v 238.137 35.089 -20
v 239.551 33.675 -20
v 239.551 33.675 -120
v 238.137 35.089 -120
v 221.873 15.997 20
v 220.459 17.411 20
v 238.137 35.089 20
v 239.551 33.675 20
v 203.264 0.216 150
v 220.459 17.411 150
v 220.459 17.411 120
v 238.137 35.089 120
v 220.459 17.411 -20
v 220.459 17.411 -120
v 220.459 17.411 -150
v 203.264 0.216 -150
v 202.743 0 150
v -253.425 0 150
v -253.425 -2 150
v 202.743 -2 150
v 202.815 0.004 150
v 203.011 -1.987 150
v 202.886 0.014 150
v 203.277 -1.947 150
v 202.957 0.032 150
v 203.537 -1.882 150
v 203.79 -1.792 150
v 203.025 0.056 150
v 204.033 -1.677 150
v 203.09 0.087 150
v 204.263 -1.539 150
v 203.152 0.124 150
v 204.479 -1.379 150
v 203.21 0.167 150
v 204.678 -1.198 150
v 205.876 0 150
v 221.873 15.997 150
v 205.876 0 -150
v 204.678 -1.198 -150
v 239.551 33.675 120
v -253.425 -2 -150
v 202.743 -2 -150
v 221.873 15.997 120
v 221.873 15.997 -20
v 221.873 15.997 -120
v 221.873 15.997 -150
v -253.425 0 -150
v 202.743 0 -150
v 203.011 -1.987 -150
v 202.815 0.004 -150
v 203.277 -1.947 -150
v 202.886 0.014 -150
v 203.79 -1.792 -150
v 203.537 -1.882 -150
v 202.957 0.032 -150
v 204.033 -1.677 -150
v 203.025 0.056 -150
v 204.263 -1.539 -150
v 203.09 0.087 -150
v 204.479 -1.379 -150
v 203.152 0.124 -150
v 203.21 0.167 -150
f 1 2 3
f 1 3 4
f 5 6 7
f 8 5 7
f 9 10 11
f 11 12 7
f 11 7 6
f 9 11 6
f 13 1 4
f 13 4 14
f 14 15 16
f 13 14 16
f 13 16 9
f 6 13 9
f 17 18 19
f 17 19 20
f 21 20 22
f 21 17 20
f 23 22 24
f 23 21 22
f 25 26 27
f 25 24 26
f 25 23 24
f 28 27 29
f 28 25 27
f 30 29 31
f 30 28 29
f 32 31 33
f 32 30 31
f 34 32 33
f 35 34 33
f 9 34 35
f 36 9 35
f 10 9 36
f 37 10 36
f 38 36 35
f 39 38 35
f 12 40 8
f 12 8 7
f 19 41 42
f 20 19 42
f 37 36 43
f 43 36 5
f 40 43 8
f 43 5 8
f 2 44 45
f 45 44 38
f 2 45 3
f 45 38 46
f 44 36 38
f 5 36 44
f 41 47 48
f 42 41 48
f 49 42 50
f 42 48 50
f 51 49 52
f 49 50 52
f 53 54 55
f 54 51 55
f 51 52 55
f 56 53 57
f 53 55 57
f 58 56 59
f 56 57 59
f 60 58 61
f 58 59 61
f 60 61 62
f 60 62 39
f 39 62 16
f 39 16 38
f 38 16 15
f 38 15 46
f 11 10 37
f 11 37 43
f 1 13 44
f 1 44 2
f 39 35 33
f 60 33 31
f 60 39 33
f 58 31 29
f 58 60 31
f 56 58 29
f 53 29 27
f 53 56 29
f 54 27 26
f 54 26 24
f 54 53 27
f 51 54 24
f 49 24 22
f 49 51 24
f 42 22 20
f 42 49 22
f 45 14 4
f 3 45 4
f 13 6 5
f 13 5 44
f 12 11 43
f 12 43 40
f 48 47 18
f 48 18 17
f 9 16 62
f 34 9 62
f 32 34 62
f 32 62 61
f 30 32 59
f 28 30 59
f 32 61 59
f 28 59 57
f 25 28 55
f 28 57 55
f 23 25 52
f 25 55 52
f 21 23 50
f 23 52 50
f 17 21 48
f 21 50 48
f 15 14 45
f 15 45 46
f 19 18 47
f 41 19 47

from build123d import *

# Parameters (mm, degrees)
ESBO_O1_W               = 506.849315068
ESBO_O1_H               = 300
FLANGE_BASE1_DEPTH      = 2
DOBRA_START             = -150
DOBRA_ESBO_ADA1_DEPTH   = 300
DOBRA_ESBO_ADA1_2_DEPTH = 300
ESBO_O7_W               = 25
ESBO_O7_H               = 30
ESBO_O7_H_2             = 40
CORTE_EXTRUS_O1_DEPTH   = 409.841691807


# Read off the part's stored shape, not the designer's step: Dobra esboçada1
# Sheet-metal steps are written as plain solids
with BuildPart() as part:
    # Esboço1 → Flange-base1 (new body)
    with BuildSketch(Plane(origin=(0, 0, 0), x_dir=(1, 0, 0), z_dir=(0, 1, 0))):
        Rectangle(ESBO_O1_W, ESBO_O1_H)
    extrude(amount=-FLANGE_BASE1_DEPTH)

    # Dobra esboçada1 outline → Dobra esboçada1 (cut)
    with BuildSketch(Plane.XY.offset(DOBRA_START)):
        with BuildLine():
            Line((253.424657534, 0), (205.876233143, 0))
            Line((205.876233143, 0), (204.677764726, -1.198468417))
            ThreePointArc((204.677764726, -1.198468417), (203.78994779, -1.791688729), (202.742696309, -2))
            Line((202.742696309, -2), (253.424657534, -2))
            Line((253.424657534, -2), (253.424657534, 0))
        make_face()
    extrude(amount=DOBRA_ESBO_ADA1_DEPTH, mode=Mode.SUBTRACT)

    # Dobra esbo_ada1 2 outline → Dobra esbo_ada1 2 (add)
    with BuildSketch(Plane.XY.offset(DOBRA_START)):
        with BuildLine():
            Line((238.136670816, 35.088864797), (203.263551164, 0.215745145))
            ThreePointArc((203.263551164, 0.215745145), (203.024580925, 0.056070336), (202.742696309, 0))
            Line((202.742696309, 0), (205.876233143, 0))
            Line((205.876233143, 0), (239.550884379, 33.674651235))
            Line((239.550884379, 33.674651235), (238.136670816, 35.088864797))
        make_face()
    extrude(amount=DOBRA_ESBO_ADA1_2_DEPTH)

    # Esboço7 → Corte-extrusão1 (cut, through all)
    with BuildSketch(Plane(origin=(101.52390301, -101.52390301, 0), x_dir=(0.7071067811865464, 0.7071067811865488, 0), z_dir=(-0.7071067811865488, 0.7071067811865464, 0))):
        with Locations((180.699629026, 135)):
            Rectangle(ESBO_O7_W, ESBO_O7_H)
        with Locations((180.699629026, 0)):
            Rectangle(ESBO_O7_W, ESBO_O7_H_2)
        with Locations((180.699629026, -135)):
            Rectangle(ESBO_O7_W, ESBO_O7_H)
    extrude(amount=-CORTE_EXTRUS_O1_DEPTH, mode=Mode.SUBTRACT)


solid = part.part
